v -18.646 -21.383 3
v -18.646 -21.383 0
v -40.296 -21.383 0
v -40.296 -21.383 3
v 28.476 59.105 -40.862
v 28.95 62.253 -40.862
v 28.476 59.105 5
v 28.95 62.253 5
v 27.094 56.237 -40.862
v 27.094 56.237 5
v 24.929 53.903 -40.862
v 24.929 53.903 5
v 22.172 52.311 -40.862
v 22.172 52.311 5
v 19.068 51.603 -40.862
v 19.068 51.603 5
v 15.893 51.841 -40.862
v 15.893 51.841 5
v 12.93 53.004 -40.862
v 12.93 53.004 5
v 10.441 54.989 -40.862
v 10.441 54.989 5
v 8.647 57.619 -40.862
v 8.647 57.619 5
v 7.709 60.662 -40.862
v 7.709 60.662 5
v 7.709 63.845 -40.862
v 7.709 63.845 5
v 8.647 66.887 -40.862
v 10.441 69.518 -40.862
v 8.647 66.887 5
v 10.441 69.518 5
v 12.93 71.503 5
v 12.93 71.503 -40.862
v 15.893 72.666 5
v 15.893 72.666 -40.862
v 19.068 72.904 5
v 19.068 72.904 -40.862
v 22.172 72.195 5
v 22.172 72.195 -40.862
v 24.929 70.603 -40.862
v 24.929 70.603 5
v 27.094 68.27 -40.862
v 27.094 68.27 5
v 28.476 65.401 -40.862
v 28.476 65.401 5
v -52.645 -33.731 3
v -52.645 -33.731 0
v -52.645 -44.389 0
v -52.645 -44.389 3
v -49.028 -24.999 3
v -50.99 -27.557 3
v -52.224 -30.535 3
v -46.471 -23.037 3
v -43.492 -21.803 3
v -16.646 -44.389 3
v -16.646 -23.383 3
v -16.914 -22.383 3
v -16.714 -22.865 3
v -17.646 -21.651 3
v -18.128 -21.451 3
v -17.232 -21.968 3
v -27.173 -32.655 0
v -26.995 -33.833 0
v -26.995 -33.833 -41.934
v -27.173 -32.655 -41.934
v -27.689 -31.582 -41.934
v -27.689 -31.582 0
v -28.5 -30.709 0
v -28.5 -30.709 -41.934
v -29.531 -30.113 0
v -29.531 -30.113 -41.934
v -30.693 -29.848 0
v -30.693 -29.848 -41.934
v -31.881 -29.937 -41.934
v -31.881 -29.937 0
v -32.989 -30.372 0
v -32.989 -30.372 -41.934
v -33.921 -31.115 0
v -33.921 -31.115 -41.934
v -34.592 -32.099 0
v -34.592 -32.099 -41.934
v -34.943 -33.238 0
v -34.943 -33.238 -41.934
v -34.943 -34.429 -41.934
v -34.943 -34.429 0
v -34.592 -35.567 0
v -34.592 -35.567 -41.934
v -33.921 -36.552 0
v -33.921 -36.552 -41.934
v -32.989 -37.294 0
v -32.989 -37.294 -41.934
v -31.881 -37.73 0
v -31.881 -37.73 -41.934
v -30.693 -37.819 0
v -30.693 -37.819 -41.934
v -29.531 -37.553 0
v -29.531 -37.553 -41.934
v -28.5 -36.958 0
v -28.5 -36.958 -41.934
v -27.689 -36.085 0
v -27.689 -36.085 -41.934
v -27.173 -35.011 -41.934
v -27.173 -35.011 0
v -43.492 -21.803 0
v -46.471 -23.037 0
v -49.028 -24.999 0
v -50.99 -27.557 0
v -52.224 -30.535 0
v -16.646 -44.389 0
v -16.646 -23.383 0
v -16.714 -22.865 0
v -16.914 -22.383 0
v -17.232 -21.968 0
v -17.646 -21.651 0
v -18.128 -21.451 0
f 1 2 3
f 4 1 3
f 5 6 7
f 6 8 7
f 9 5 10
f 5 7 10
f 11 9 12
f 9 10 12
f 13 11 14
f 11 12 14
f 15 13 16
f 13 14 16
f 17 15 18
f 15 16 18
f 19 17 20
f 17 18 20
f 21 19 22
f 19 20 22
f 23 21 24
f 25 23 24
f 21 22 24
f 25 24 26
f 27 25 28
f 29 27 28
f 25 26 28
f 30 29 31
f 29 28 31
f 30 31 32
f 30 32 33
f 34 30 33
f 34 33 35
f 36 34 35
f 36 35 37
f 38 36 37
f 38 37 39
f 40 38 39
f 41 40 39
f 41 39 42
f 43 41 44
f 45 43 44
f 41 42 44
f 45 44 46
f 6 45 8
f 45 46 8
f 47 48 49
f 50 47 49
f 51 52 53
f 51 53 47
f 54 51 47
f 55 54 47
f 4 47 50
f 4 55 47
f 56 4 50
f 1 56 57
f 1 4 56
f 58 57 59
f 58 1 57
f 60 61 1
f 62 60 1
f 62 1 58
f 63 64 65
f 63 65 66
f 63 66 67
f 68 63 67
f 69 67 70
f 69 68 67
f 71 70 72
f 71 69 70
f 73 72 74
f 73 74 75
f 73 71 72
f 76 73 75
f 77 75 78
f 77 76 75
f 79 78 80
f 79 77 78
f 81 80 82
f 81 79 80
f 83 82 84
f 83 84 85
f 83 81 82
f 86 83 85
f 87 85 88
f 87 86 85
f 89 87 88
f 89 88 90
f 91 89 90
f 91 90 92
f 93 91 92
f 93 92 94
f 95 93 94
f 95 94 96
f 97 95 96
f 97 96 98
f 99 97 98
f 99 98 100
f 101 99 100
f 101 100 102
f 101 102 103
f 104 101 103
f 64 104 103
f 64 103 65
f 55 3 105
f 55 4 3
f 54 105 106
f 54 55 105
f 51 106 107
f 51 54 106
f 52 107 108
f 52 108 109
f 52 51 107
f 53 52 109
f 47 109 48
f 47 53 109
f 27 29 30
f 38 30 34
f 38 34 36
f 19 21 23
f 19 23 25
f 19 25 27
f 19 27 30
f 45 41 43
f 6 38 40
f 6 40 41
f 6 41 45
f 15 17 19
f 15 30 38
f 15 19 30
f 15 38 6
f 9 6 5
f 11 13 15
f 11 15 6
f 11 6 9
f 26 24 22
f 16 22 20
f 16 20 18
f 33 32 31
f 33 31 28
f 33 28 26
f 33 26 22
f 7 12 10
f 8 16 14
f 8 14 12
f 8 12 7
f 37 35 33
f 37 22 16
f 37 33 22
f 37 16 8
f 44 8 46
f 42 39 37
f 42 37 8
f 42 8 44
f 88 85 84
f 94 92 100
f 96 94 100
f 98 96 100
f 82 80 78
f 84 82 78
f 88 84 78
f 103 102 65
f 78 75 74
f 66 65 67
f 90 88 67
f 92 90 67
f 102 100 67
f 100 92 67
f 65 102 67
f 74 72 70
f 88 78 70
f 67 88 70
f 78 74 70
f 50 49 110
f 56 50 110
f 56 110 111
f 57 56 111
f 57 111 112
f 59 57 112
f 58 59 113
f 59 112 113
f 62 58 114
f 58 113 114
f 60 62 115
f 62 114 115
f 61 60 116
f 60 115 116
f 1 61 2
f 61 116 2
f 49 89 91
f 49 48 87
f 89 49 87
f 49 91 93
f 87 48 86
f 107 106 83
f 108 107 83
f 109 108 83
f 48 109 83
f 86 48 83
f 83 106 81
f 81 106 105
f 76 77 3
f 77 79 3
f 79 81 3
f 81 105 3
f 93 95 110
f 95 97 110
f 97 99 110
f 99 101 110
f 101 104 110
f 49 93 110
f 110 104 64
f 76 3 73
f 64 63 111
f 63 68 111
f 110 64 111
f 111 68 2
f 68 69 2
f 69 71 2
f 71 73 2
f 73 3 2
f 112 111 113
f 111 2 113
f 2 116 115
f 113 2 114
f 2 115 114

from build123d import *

# Parameters (mm, degrees)
F0_R      = 10.680204
F1_DEPTH  = 5
F3_DEPTH  = 3
F4_R      = 12.348308
F5_R      = 3.99635
F6_DEPTH  = 44.934362
F1_FACE_R = 10.680204
F7_DEPTH  = 40.8618


with BuildPart() as f1:
    # F0 (on Top) → F1 (new body)
    with BuildSketch(Plane.XY):
        with Locations((18.270001, 62.253341)):
            Circle(F0_R)
    extrude(amount=F1_DEPTH)

    # F1_face (on face) → F7 (join)
    with BuildSketch(Plane(origin=(18.270001, 62.253341, 0), x_dir=(1, 0, 0), z_dir=(0, 0, -1))):
        Circle(F1_FACE_R)
    extrude(amount=F7_DEPTH)


with BuildPart() as f3:
    # F2 (on Top) → F3 (new body)
    with BuildSketch(Plane.XY):
        with BuildLine():
            ThreePointArc((-16.646005, -23.382689), (-17.231792, -21.968476), (-18.646005, -21.382689))
            Line((-18.646005, -21.382689), (-52.644692, -21.382689))
            Line((-52.644692, -21.382689), (-52.644692, -44.389367))
            Line((-52.644692, -44.389367), (-16.646005, -44.389367))
            Line((-16.646005, -44.389367), (-16.646005, -23.382689))
        make_face()
    extrude(amount=F3_DEPTH)

    # F4
    f4_edges = [f3.edges().sort_by_distance(p)[0] for p in [
        (-52.644692, -21.382689, 1.5),
    ]]
    fillet(f4_edges, radius=F4_R)

    # F5 (on face) → F6 (join)
    with BuildSketch(Plane.XY.offset(3)):
        with Locations((-30.991316, -33.833347)):
            Circle(F5_R)
    extrude(amount=-F6_DEPTH)


solid = Compound([f1.part, f3.part])
